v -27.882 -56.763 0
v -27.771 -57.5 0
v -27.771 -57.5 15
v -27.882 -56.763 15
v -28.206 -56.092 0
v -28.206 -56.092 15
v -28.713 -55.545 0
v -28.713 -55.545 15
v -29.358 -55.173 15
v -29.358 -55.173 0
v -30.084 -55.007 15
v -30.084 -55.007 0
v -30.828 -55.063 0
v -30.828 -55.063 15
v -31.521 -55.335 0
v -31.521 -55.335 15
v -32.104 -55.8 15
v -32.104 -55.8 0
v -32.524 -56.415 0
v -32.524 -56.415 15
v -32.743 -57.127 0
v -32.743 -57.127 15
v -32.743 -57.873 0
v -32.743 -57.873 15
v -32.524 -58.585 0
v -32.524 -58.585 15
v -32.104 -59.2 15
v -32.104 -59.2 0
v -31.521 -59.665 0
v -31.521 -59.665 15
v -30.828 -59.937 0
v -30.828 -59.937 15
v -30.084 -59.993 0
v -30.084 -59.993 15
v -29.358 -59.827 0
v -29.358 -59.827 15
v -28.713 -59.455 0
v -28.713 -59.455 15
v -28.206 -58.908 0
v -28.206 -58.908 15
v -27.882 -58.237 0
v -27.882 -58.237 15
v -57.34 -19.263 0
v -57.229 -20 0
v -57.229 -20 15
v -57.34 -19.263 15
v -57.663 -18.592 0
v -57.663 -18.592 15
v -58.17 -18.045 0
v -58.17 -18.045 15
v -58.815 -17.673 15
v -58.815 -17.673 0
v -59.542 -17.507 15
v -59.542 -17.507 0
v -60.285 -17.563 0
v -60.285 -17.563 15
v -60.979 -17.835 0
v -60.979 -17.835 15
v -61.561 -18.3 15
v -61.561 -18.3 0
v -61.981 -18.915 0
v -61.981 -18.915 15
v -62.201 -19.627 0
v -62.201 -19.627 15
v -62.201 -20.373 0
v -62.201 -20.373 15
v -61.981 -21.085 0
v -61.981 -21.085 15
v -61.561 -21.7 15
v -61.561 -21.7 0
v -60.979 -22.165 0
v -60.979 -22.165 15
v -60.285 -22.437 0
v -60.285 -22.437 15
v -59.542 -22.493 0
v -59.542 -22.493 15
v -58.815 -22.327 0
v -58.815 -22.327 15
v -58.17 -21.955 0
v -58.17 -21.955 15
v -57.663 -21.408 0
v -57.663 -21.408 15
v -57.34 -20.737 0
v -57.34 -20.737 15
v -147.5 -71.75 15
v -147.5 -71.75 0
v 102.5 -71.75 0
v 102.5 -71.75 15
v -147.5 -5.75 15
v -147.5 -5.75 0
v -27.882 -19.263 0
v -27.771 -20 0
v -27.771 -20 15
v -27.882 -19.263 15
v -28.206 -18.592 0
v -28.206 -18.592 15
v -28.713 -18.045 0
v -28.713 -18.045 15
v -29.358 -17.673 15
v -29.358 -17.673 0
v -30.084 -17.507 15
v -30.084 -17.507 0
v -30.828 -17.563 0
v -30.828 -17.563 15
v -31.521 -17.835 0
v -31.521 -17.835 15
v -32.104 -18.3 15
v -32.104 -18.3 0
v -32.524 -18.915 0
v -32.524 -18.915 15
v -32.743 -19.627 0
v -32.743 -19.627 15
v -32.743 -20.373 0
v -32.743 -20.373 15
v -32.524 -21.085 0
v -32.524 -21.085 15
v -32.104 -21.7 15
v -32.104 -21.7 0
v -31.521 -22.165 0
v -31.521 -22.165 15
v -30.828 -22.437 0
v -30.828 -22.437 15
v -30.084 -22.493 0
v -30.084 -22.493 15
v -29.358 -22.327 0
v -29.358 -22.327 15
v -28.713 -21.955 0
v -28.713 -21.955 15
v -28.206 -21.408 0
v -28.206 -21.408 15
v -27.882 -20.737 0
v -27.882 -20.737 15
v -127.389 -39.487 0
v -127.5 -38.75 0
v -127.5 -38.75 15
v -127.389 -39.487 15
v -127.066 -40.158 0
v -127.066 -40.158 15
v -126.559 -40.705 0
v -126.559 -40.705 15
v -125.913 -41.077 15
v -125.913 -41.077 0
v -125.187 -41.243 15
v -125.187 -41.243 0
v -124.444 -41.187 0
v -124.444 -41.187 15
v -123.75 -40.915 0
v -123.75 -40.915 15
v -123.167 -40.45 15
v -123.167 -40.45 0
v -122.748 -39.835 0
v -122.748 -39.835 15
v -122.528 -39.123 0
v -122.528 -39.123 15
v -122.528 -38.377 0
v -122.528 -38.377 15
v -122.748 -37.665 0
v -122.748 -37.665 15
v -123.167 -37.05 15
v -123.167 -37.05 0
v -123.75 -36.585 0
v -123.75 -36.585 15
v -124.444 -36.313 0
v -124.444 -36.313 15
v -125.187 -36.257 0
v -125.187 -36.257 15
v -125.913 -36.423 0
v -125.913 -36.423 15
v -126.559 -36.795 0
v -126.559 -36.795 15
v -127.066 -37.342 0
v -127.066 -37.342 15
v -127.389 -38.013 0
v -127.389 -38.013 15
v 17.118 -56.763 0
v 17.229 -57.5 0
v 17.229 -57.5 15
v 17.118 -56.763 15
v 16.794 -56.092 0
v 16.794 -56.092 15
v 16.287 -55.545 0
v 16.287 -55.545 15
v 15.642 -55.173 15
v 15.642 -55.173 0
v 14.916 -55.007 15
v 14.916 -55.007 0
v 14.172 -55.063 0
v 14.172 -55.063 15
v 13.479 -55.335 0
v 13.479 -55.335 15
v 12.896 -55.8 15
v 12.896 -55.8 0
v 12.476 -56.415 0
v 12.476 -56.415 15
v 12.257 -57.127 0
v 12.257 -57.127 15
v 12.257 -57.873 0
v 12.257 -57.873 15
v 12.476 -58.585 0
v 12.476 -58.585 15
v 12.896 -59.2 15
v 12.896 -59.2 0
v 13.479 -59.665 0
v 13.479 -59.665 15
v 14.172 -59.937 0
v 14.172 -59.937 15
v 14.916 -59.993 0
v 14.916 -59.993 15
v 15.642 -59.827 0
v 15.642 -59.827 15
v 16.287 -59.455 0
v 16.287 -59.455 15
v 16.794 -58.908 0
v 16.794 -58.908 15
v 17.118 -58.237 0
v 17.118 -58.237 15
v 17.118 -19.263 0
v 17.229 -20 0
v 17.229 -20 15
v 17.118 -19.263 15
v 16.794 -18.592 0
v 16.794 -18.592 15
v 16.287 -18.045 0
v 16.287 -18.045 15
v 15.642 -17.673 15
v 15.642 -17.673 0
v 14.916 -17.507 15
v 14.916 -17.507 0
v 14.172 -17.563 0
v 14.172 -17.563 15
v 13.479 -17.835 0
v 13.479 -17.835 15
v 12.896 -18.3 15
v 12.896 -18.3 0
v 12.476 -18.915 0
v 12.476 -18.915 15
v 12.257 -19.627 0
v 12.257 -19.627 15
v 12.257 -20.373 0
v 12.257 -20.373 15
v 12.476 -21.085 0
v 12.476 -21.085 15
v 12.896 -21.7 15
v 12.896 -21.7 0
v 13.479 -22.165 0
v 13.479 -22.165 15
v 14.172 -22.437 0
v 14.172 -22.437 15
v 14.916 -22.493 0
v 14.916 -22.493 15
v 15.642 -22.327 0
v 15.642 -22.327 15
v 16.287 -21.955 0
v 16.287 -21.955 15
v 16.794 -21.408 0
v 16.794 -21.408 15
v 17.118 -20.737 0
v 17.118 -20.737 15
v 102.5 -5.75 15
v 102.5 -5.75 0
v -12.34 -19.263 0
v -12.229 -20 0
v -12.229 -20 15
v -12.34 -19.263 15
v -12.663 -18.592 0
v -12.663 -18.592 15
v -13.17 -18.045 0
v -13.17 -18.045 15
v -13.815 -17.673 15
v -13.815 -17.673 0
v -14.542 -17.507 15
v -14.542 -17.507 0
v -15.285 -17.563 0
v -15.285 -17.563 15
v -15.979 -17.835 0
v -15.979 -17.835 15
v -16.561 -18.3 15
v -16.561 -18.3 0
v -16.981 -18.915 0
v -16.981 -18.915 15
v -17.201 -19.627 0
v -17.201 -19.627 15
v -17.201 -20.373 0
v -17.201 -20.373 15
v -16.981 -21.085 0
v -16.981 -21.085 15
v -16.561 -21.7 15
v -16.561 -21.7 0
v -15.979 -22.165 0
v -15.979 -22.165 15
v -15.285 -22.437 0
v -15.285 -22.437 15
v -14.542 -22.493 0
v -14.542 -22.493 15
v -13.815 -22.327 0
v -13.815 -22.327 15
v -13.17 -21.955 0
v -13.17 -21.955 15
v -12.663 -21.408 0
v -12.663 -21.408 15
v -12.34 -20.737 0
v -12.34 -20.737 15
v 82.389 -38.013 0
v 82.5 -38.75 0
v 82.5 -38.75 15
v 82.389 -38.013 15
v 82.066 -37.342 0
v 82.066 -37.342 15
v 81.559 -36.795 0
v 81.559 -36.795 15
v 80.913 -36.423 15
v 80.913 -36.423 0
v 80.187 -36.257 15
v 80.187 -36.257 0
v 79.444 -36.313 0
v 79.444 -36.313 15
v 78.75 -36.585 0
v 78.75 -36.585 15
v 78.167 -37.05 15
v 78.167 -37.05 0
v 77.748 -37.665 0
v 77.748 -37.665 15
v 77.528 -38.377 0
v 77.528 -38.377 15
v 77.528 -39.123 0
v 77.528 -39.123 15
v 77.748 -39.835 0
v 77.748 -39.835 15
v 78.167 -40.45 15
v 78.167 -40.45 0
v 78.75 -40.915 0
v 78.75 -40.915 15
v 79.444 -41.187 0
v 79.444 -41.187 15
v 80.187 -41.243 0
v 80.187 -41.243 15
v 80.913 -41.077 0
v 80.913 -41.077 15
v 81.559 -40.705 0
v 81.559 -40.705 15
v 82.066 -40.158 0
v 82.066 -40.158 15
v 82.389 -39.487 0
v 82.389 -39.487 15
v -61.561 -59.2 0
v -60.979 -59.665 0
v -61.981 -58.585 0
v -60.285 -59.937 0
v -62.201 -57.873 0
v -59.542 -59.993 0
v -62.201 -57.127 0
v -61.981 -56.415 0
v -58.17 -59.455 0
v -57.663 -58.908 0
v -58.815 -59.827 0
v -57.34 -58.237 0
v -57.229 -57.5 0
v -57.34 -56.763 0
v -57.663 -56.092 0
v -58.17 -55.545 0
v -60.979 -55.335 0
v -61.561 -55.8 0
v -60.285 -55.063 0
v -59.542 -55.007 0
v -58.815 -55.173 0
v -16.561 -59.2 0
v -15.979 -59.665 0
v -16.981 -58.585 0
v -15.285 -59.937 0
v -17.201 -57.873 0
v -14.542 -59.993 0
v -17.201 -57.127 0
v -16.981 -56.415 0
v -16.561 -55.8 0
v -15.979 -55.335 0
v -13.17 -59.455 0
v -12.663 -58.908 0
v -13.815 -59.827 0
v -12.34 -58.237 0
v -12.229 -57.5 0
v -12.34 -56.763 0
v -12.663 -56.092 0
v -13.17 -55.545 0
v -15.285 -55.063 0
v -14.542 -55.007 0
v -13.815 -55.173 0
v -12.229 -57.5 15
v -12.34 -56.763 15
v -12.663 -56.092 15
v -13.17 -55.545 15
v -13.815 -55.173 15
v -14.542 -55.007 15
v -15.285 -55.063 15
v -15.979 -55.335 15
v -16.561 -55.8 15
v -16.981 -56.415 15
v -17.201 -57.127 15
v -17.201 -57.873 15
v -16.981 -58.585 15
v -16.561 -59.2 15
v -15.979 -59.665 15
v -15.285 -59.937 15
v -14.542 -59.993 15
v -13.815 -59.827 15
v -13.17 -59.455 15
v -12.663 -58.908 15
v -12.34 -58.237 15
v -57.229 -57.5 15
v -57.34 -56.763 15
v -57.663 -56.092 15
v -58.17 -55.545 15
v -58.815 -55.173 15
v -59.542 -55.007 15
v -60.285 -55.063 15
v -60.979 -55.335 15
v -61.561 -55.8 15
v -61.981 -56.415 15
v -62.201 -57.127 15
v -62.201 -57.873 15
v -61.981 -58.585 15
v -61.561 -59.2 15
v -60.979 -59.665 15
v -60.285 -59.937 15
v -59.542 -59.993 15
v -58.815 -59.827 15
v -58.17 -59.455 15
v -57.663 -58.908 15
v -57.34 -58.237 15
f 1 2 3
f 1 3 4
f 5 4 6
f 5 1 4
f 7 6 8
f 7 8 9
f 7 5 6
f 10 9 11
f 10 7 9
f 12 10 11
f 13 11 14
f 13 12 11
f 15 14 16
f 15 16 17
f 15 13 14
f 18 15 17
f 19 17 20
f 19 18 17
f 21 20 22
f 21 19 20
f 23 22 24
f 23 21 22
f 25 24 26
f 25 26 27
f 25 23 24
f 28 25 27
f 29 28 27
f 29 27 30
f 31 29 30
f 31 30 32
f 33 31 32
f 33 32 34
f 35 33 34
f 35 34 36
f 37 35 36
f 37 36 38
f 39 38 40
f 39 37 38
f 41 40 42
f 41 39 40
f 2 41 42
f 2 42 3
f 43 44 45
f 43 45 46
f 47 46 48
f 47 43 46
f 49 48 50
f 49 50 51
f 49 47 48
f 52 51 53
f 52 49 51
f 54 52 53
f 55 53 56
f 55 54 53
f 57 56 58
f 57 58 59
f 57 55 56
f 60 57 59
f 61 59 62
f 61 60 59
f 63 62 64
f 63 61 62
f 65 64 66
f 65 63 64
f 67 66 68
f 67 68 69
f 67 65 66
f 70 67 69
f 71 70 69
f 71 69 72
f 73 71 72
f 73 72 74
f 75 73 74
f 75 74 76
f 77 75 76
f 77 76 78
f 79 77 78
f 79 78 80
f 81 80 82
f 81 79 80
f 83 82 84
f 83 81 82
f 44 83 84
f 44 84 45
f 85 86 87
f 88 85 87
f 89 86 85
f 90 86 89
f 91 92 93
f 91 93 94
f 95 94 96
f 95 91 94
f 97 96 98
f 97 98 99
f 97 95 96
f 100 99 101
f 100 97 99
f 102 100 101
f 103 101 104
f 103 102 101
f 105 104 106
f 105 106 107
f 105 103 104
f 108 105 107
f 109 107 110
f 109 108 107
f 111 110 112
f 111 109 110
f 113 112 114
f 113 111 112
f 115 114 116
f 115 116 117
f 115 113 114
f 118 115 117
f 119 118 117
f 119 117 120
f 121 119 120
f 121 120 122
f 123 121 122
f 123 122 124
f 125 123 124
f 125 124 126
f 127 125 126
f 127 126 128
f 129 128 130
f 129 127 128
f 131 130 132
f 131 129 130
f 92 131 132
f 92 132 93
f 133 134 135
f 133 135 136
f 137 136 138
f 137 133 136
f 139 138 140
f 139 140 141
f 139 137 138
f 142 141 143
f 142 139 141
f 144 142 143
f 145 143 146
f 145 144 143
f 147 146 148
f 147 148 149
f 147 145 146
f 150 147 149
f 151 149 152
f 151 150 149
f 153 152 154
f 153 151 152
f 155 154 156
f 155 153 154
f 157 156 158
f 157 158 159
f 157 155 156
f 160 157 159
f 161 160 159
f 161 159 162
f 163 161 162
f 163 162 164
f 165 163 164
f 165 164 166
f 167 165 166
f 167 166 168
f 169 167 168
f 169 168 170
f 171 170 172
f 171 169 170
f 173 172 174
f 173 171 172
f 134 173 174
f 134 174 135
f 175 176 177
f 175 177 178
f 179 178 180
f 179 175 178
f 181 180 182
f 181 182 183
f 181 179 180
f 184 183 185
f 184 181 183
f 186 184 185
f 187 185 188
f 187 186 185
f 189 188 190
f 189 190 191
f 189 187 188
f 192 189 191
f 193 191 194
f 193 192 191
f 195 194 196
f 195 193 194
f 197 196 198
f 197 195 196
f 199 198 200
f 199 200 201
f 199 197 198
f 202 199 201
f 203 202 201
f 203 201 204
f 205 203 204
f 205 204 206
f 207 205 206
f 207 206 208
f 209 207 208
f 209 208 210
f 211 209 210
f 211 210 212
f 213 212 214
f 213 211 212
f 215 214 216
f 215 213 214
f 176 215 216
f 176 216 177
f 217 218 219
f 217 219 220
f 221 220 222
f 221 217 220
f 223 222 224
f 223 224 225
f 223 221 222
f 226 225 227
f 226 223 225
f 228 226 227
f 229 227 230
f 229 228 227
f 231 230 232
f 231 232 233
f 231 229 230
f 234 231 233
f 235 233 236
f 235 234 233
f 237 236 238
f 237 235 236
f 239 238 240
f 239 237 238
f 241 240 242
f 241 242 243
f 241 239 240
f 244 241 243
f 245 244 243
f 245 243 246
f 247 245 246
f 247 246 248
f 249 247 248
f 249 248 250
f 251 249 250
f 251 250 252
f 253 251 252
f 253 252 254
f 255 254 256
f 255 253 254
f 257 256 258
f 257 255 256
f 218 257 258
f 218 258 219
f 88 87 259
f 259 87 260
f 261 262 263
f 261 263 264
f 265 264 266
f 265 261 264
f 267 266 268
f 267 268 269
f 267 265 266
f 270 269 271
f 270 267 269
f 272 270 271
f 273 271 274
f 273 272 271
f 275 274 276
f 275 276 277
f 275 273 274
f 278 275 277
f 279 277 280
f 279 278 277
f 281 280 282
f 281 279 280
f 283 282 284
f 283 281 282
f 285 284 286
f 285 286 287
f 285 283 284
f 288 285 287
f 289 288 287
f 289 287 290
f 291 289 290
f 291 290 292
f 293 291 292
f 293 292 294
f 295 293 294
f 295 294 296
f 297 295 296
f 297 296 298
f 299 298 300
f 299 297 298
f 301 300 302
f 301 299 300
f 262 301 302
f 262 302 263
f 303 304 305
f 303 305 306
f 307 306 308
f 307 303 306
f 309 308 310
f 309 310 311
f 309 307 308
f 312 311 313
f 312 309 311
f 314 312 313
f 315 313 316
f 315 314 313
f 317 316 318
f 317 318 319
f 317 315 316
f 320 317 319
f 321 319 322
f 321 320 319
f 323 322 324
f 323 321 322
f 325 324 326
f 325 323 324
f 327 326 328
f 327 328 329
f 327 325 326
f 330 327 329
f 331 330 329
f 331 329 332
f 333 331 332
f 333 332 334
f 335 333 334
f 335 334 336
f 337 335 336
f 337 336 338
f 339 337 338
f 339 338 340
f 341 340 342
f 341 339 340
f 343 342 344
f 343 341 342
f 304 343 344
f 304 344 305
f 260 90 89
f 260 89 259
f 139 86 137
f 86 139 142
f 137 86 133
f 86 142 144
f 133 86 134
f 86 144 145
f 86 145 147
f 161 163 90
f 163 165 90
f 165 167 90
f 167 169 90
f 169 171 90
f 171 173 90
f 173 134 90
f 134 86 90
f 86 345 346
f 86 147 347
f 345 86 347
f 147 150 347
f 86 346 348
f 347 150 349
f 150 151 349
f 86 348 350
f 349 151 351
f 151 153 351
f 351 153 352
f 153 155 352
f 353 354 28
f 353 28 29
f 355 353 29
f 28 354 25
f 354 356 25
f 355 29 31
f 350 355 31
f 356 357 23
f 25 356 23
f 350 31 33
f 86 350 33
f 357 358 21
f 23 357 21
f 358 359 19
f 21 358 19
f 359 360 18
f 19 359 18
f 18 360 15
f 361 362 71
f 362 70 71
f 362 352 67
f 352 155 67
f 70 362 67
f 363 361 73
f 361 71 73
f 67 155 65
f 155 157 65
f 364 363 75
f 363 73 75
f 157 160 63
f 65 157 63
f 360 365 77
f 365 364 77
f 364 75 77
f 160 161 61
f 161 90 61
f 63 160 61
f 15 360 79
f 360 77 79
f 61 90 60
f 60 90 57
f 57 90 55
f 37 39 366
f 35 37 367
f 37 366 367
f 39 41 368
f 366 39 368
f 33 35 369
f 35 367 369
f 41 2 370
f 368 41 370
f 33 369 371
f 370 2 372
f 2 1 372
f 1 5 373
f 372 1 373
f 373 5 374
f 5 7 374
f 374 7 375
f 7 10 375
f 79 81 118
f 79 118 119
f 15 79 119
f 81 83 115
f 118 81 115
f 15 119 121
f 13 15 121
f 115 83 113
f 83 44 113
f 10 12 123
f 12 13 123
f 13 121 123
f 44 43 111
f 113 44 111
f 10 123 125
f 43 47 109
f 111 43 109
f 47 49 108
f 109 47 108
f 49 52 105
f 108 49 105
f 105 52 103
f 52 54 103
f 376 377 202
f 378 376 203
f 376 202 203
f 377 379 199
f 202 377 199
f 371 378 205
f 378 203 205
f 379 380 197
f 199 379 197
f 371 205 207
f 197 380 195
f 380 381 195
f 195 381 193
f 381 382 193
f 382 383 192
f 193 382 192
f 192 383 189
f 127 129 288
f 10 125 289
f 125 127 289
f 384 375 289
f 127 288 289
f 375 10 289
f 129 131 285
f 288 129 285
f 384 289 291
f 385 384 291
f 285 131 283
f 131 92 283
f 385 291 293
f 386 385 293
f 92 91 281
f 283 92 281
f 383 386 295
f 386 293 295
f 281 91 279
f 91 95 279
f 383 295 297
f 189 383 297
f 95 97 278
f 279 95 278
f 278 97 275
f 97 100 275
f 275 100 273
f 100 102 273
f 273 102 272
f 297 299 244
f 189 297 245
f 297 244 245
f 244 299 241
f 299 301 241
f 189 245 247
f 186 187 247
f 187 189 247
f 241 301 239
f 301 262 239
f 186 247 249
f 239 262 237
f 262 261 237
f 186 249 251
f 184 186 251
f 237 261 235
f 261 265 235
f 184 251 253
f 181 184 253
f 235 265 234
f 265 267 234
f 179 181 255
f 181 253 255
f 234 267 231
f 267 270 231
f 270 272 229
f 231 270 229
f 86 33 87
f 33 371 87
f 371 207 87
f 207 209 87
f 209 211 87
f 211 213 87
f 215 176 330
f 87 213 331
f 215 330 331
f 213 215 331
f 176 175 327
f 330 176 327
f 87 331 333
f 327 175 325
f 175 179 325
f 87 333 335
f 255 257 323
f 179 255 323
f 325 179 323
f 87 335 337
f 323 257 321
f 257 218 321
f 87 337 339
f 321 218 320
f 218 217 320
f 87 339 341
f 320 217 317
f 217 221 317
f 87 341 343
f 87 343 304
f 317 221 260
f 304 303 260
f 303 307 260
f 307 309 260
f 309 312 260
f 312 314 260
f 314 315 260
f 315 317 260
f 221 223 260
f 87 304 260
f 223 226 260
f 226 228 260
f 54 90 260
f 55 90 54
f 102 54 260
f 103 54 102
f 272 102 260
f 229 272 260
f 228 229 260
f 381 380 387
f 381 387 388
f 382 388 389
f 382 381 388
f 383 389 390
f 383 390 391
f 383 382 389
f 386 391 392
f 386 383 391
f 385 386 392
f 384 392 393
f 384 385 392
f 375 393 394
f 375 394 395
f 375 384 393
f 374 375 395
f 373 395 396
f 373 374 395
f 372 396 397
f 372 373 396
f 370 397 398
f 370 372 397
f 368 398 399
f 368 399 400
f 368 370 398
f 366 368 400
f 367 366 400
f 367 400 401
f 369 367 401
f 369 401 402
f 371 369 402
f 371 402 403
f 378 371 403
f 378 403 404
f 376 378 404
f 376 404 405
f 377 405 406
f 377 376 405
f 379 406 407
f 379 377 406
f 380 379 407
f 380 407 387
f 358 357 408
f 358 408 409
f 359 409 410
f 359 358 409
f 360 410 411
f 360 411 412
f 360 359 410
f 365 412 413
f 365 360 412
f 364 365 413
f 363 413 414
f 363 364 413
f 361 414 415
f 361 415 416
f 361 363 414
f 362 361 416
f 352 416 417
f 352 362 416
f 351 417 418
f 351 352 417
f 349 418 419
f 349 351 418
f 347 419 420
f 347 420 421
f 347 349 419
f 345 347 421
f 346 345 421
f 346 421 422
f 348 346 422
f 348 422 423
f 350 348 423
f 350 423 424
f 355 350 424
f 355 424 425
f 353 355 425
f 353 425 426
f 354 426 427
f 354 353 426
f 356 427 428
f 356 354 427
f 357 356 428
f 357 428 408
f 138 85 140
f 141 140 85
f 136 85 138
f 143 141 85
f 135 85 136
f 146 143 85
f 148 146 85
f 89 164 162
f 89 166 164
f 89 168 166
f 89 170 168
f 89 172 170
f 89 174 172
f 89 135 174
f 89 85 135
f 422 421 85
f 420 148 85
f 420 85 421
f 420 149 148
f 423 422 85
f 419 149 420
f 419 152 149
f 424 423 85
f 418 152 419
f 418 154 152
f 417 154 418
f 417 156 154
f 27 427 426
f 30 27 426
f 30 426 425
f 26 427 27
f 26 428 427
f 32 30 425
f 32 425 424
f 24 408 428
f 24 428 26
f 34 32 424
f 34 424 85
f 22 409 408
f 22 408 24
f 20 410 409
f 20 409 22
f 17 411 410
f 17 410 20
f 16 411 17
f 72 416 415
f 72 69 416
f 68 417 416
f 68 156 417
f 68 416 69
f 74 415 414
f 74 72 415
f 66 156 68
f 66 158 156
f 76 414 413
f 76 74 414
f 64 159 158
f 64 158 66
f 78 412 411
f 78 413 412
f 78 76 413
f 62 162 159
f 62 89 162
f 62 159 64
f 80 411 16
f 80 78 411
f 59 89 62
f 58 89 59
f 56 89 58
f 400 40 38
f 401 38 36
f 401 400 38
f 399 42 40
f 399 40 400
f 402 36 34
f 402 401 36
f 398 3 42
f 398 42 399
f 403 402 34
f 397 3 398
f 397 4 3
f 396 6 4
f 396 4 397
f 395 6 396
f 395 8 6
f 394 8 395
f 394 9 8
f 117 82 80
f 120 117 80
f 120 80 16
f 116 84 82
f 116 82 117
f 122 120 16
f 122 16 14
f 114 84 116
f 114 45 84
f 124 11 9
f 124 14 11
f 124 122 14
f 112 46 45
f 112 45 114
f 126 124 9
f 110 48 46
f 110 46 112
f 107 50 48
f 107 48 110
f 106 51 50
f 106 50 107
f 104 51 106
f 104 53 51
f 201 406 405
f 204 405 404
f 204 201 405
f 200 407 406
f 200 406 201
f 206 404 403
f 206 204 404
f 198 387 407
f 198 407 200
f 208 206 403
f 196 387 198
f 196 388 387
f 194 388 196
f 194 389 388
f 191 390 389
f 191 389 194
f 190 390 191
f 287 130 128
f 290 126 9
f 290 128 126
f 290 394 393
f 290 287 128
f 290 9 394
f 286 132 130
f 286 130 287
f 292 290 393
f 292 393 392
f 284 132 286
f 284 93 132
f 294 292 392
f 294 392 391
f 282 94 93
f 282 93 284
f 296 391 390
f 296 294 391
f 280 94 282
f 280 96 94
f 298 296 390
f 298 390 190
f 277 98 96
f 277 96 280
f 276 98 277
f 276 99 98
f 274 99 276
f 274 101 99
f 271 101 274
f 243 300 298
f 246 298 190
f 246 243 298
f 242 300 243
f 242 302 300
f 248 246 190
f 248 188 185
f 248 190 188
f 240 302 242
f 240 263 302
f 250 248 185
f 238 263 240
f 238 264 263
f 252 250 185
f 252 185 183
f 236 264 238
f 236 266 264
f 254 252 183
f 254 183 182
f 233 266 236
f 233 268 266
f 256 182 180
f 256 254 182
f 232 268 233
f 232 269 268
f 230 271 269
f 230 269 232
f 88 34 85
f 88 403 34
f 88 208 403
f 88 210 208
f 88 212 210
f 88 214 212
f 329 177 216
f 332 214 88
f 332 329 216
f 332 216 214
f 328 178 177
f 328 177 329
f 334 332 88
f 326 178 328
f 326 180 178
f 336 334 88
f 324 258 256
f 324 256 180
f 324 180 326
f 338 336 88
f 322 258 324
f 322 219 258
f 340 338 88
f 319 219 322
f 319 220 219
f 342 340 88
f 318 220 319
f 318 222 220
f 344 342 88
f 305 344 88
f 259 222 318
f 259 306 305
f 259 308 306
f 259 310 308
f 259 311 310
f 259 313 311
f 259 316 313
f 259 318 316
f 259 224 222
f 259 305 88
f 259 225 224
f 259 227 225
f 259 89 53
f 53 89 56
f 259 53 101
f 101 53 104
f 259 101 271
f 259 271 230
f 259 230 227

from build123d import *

# Parameters (mm, degrees)
SKETCH1_W           = 250
SKETCH1_H           = 66
SKETCH1_R           = 2.5
BOSS_EXTRUDE1_DEPTH = 15


with BuildPart() as part:
    # Sketch1 → Boss-Extrude1 (new body)
    with BuildSketch(Plane.XY):
        with Locations((-22.5, -38.75)):
            Rectangle(SKETCH1_W, SKETCH1_H)
        with Locations((14.728679071, -20)):
            Circle(SKETCH1_R, mode=Mode.SUBTRACT)
        with Locations((14.728679071, -57.5)):
            Circle(SKETCH1_R, mode=Mode.SUBTRACT)
        with Locations((-14.728679071, -57.5)):
            Circle(SKETCH1_R, mode=Mode.SUBTRACT)
        with Locations((-14.728679071, -20)):
            Circle(SKETCH1_R, mode=Mode.SUBTRACT)
        with Locations((-30.271320929, -20)):
            Circle(SKETCH1_R, mode=Mode.SUBTRACT)
        with Locations((-30.271320929, -57.5)):
            Circle(SKETCH1_R, mode=Mode.SUBTRACT)
        with Locations((-59.728679071, -57.5)):
            Circle(SKETCH1_R, mode=Mode.SUBTRACT)
        with Locations((-59.728679071, -20)):
            Circle(SKETCH1_R, mode=Mode.SUBTRACT)
        with Locations((80, -38.75)):
            Circle(SKETCH1_R, mode=Mode.SUBTRACT)
        with Locations(Location((-125, -38.75, 0), (0, 0, 180))):
            Circle(SKETCH1_R, mode=Mode.SUBTRACT)
    extrude(amount=BOSS_EXTRUDE1_DEPTH)


solid = part.part
